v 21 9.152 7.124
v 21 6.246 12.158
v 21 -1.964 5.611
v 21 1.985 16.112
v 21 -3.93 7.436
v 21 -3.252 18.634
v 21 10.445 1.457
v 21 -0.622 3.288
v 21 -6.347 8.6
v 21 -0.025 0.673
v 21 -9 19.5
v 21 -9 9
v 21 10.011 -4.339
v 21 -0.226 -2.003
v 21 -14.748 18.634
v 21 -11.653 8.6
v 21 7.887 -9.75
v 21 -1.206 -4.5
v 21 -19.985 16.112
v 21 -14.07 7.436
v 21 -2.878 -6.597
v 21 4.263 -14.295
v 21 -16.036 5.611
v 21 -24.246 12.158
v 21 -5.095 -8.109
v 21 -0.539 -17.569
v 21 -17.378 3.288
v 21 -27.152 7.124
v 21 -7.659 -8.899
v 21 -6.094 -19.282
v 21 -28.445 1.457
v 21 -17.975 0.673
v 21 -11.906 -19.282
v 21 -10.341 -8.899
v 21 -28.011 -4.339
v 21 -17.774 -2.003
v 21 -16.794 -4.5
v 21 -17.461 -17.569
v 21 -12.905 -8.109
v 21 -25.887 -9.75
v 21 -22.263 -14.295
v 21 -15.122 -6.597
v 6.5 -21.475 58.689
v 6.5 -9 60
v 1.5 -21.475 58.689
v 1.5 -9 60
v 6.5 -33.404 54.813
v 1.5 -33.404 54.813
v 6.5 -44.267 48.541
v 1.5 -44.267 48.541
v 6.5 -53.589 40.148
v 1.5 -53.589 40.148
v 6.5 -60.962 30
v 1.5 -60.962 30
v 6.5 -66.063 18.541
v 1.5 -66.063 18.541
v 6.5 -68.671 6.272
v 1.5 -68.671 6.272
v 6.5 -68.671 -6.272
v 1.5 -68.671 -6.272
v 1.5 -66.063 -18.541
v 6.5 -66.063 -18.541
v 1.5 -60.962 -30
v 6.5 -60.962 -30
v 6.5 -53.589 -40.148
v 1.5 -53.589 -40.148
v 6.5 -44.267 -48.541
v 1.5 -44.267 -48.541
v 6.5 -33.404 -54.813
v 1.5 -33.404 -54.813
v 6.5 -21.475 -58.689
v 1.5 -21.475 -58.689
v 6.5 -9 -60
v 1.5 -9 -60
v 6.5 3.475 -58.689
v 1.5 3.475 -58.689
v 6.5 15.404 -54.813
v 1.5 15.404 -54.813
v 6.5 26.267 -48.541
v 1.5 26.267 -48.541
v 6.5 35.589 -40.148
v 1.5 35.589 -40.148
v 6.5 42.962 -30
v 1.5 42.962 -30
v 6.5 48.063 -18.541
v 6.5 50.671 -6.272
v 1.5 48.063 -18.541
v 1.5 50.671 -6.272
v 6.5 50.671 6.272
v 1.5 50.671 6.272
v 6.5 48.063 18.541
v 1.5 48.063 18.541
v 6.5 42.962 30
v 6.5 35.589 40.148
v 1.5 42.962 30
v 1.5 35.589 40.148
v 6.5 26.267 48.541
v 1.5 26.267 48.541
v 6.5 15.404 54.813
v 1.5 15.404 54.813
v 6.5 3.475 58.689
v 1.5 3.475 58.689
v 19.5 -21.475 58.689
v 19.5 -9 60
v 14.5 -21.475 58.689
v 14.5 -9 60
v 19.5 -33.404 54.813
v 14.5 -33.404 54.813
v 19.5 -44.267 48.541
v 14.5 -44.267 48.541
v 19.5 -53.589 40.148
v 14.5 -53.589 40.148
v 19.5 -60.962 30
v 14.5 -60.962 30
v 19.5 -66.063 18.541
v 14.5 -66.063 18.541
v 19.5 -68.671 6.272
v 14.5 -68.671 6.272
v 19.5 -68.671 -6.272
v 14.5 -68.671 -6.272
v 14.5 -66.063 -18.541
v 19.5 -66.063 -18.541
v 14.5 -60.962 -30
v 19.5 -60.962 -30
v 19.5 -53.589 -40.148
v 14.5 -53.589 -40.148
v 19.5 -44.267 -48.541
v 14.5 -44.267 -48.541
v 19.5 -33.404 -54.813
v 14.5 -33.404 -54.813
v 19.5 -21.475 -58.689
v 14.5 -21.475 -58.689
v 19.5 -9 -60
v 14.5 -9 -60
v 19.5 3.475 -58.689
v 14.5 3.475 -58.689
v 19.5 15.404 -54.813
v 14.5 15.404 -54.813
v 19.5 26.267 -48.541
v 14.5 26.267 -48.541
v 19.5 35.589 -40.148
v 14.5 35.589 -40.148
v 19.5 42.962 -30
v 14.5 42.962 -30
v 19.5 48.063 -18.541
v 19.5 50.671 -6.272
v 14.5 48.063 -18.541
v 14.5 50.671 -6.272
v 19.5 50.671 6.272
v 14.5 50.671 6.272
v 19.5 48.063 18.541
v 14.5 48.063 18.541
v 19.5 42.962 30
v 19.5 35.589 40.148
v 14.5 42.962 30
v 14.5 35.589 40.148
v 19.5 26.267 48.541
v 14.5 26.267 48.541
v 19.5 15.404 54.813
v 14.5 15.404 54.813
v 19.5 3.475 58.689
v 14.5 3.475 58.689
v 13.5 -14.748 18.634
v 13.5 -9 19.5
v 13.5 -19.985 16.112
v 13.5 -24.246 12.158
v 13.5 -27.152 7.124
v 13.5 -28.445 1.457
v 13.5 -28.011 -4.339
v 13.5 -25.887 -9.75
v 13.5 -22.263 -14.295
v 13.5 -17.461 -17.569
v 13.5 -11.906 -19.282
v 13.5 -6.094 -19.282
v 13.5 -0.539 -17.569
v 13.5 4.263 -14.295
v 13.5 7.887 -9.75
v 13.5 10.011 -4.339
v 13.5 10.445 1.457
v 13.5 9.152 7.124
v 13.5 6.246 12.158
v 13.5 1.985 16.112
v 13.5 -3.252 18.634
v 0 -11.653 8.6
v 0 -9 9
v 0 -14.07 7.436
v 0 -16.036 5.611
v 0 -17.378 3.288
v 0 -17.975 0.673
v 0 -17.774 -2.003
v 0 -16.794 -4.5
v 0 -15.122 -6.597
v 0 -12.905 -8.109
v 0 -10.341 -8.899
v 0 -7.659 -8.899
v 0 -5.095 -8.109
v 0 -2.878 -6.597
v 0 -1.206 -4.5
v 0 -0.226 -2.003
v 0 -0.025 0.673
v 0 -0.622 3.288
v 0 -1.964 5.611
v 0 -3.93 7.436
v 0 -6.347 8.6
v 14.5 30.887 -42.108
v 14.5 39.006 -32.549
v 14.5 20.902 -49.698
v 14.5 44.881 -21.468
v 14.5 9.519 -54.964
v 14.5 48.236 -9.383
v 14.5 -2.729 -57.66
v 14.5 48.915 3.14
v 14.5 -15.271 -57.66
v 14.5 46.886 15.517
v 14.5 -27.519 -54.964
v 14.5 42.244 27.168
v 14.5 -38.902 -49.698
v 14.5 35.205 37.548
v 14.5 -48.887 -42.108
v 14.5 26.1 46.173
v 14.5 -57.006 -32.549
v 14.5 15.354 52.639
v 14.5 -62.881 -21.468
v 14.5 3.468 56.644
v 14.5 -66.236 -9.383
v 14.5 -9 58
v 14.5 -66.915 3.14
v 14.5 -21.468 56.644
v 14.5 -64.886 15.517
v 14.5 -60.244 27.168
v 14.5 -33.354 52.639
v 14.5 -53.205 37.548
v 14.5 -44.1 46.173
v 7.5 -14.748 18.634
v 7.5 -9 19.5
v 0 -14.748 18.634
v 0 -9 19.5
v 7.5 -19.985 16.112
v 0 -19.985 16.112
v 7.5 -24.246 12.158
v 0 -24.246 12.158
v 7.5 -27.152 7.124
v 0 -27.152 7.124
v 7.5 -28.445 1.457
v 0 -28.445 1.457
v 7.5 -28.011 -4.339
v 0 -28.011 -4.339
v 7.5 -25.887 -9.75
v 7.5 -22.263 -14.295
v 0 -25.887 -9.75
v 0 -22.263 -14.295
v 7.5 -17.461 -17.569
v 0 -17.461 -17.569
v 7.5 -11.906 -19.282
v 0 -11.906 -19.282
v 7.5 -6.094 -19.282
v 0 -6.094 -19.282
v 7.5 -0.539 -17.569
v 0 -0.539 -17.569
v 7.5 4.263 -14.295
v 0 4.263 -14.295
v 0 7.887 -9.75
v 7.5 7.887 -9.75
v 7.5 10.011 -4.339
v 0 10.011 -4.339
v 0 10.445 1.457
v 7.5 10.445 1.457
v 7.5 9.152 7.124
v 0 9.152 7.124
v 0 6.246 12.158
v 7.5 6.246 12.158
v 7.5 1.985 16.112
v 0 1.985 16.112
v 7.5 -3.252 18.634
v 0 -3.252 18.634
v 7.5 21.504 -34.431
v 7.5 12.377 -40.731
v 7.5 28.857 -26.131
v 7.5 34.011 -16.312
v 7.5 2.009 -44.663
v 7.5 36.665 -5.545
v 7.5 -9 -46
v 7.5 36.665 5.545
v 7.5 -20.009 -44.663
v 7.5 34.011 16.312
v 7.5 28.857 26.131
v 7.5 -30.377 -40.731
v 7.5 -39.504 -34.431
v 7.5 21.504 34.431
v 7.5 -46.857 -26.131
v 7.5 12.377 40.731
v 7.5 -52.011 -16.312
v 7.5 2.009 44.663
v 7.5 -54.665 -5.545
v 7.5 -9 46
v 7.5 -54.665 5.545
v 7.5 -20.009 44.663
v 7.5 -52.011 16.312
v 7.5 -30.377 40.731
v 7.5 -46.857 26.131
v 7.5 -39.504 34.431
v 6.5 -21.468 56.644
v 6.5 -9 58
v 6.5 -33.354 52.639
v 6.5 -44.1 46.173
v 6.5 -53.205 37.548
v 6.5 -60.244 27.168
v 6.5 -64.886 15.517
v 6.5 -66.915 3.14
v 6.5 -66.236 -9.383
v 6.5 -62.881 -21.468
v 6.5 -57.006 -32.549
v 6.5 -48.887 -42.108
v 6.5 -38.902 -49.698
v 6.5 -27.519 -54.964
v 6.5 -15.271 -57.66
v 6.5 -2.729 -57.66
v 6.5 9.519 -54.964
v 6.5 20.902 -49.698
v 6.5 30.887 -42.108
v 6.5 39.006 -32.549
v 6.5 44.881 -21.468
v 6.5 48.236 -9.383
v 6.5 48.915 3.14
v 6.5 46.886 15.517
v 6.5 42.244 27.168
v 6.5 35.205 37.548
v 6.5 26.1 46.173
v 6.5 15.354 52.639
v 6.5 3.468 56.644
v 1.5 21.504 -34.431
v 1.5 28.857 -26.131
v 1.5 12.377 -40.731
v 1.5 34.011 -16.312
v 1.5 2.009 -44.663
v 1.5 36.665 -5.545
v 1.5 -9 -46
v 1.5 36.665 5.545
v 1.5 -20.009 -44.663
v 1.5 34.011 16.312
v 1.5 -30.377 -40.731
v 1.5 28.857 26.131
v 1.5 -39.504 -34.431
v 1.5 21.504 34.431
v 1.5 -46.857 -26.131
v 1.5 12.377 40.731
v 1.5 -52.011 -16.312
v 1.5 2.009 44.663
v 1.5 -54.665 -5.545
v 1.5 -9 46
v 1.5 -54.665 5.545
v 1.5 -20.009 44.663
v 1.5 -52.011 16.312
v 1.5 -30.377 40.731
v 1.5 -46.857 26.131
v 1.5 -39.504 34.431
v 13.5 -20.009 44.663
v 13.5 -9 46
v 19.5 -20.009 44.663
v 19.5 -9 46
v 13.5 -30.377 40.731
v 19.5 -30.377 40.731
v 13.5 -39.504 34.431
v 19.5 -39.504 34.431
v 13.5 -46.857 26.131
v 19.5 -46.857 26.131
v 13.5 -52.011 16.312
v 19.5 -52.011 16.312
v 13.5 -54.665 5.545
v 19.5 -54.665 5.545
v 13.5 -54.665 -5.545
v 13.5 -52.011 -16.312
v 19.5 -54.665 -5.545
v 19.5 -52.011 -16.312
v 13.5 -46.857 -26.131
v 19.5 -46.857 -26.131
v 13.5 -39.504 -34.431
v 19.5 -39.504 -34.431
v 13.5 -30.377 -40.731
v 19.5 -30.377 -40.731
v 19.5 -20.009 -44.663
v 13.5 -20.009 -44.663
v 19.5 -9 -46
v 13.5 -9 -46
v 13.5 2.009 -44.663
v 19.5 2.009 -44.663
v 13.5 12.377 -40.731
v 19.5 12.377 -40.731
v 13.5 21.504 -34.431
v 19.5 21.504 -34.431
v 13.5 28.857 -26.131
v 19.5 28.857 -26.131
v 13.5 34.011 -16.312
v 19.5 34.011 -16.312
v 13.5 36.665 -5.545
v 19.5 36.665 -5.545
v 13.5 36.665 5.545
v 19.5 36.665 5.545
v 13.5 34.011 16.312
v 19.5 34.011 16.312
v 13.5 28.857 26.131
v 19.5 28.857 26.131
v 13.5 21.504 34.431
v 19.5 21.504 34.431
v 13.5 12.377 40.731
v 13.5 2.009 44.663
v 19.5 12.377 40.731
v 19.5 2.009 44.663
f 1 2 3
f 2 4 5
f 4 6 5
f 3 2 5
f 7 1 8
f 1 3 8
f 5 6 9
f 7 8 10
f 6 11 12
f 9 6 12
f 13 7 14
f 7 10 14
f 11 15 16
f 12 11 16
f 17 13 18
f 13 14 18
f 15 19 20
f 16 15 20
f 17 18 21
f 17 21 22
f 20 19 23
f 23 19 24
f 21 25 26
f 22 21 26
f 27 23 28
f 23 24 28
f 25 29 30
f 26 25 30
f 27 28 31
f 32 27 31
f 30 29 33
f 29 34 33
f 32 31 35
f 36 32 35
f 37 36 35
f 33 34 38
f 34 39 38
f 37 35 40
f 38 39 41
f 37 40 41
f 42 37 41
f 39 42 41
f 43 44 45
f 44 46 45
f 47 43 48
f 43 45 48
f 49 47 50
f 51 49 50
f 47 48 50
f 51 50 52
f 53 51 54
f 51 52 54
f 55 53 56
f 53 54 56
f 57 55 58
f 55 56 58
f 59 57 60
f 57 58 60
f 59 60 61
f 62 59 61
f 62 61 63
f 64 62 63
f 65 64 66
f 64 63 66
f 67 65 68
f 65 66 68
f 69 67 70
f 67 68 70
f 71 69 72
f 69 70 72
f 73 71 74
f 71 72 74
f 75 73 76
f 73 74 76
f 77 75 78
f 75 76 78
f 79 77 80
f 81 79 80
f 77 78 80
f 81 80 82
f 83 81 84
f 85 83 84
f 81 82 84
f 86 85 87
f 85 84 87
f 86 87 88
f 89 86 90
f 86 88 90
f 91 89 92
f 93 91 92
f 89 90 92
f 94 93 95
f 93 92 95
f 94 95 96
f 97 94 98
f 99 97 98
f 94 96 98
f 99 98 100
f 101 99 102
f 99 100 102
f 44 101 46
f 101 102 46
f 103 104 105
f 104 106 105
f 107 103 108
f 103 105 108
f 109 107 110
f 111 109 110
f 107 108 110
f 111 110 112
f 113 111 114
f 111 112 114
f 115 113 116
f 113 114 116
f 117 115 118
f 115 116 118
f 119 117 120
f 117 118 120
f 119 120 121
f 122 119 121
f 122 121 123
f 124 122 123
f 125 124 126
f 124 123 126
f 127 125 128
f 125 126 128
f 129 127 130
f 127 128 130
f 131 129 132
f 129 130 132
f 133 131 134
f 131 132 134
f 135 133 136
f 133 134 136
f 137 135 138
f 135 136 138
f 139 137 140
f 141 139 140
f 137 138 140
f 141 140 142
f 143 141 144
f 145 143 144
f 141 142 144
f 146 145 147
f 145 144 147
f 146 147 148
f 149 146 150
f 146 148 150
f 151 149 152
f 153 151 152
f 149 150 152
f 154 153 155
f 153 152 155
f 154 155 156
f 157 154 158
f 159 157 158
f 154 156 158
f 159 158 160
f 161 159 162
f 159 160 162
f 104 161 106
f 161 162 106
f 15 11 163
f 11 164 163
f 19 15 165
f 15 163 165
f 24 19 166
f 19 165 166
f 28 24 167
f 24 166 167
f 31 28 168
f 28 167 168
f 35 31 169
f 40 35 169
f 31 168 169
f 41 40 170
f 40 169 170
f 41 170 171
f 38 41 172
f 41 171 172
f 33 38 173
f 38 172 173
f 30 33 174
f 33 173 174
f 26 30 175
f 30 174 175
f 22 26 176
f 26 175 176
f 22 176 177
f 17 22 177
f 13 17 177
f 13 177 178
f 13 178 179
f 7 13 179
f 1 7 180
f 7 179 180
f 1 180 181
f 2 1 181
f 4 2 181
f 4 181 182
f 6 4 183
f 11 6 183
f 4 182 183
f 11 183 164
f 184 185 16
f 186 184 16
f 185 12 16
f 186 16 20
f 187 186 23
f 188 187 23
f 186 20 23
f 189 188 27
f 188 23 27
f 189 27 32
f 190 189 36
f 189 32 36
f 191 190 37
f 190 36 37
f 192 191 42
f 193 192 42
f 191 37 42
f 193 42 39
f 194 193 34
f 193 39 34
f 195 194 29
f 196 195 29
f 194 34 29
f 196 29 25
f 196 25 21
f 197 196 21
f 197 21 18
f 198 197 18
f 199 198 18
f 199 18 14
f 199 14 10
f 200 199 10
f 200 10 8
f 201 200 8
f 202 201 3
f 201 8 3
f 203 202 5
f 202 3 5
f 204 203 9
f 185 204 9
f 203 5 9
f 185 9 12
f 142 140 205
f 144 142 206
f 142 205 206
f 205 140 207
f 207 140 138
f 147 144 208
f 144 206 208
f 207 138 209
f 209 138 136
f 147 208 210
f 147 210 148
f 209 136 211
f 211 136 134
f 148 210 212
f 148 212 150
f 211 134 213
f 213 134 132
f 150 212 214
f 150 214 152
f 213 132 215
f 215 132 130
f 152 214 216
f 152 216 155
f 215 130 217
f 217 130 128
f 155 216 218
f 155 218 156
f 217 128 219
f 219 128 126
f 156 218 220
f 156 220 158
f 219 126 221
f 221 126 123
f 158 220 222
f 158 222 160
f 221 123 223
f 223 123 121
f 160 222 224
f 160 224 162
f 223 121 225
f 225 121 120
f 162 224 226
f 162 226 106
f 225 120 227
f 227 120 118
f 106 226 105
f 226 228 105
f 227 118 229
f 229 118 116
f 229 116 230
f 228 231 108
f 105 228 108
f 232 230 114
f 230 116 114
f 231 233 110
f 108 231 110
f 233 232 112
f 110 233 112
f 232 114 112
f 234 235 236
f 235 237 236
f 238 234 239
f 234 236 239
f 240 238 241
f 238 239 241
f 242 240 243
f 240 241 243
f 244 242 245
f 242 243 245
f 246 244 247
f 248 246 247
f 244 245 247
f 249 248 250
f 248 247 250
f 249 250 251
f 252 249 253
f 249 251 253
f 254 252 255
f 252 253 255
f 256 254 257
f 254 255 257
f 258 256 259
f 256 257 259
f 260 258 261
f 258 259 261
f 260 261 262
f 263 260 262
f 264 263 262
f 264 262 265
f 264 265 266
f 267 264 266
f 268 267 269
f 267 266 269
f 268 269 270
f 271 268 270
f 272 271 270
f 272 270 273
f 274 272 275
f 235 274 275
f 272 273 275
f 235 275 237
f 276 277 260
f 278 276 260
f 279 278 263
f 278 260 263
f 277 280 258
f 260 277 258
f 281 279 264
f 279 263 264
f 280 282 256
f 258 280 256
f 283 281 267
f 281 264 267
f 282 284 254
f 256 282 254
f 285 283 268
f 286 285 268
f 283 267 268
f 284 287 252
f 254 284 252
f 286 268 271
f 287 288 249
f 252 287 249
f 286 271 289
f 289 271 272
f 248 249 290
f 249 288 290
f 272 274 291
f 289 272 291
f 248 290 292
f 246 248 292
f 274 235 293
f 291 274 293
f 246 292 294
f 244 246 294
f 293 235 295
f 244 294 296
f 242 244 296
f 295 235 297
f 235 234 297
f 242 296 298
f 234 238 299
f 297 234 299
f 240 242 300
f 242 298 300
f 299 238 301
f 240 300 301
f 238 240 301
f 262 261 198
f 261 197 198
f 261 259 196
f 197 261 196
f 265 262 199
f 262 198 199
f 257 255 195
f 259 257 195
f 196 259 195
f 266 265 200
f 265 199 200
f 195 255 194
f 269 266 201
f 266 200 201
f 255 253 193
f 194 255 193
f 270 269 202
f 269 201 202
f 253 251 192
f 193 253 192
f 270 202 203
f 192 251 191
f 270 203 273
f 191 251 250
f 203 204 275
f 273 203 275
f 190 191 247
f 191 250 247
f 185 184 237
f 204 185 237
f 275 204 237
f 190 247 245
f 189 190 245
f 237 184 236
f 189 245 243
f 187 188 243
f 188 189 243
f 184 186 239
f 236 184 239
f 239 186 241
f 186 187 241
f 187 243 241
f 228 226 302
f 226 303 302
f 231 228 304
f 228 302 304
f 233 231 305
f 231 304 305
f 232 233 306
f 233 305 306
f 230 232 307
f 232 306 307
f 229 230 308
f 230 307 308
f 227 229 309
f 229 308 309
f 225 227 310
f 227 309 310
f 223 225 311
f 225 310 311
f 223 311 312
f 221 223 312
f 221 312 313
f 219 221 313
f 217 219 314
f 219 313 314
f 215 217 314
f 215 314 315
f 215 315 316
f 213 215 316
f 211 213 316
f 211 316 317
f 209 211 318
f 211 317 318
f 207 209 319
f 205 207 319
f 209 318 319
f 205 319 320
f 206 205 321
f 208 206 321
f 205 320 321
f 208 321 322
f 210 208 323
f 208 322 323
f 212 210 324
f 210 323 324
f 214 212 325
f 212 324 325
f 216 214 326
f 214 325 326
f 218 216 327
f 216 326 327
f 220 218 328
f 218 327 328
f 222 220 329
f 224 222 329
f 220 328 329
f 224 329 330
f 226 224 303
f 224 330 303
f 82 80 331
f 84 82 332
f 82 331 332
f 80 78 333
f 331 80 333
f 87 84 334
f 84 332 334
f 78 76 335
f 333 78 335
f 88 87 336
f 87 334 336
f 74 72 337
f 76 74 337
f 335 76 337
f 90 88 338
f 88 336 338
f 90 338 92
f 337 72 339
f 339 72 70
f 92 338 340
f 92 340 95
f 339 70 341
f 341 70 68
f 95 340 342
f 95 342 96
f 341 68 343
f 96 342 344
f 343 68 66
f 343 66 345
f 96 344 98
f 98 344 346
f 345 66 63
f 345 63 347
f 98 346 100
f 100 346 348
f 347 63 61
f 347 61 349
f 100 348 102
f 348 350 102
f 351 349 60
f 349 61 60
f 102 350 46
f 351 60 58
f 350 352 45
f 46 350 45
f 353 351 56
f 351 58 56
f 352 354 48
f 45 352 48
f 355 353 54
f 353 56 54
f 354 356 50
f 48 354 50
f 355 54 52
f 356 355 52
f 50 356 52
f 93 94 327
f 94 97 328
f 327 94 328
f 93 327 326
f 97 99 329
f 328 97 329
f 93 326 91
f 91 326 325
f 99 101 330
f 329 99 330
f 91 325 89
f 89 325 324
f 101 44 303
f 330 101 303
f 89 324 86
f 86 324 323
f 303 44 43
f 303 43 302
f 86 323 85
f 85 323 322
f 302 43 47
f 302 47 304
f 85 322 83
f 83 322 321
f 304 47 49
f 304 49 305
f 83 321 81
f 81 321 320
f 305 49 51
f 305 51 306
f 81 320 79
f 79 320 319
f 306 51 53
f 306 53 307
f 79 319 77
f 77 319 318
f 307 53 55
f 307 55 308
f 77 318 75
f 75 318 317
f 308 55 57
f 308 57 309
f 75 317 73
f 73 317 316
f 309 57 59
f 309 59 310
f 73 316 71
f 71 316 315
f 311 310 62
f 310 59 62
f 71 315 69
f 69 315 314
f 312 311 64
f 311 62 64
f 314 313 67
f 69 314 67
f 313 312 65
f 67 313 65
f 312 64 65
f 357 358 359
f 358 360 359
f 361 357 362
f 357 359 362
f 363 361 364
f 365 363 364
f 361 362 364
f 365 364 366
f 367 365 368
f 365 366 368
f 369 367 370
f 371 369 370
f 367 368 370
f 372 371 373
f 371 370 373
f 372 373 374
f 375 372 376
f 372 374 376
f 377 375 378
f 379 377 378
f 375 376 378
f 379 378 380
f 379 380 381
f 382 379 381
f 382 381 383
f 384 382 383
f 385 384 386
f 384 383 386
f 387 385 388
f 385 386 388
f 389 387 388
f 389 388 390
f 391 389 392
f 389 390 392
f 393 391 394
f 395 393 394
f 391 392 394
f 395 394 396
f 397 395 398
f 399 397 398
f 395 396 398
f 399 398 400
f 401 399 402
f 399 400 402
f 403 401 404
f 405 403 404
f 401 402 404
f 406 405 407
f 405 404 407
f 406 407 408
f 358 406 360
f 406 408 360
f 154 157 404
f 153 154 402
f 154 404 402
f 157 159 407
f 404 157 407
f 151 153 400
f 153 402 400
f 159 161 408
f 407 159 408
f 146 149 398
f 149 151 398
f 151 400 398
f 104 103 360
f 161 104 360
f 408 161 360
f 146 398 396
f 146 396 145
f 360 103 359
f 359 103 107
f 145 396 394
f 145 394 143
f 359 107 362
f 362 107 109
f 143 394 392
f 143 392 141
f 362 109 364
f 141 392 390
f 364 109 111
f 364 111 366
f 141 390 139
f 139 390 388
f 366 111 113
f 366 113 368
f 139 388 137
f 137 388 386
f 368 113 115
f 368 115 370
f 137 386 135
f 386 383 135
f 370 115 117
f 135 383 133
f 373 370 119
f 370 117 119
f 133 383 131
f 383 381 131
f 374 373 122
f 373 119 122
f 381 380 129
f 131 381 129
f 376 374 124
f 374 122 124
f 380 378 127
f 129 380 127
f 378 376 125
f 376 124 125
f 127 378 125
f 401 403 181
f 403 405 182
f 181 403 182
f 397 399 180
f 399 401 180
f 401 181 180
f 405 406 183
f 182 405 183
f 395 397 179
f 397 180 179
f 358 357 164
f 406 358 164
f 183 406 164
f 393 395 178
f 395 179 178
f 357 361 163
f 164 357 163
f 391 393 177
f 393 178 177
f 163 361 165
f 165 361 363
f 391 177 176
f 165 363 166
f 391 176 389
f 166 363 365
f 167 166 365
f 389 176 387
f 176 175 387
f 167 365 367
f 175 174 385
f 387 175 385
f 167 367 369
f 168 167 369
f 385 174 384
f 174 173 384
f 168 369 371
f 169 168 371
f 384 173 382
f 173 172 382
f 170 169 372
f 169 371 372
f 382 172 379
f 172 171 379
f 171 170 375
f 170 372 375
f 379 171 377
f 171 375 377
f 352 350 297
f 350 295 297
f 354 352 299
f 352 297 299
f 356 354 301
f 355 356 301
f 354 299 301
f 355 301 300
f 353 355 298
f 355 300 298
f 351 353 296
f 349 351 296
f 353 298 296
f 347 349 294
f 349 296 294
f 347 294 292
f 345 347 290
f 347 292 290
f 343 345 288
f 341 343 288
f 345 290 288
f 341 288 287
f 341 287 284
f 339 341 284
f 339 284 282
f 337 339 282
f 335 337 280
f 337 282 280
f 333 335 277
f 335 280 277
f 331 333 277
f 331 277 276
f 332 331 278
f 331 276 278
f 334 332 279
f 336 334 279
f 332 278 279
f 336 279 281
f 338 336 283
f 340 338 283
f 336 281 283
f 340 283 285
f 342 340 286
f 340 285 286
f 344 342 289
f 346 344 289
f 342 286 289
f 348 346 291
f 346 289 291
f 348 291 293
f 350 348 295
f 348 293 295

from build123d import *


with BuildPart() as part:
    # Esquisse1 → Révolution1 (revolve)
    with BuildSketch(Plane.XY, mode=Mode.PRIVATE) as r_volution1_sk:
        Polygon((0, 0), (21, 0), (21, 10.5), (13.5, 10.5), (13.5, 37), (19.5, 37), (19.5, 51), (14.5, 51), (14.5, 49), (6.5, 49), (6.5, 51), (1.5, 51), (1.5, 37), (7.5, 37), (7.5, 10.5), (0, 10.5), align=None)
    revolve(r_volution1_sk.sketch.rotate(Axis((0, -9, 0), (1, 0, 0)), 90), axis=Axis((0, -9, 0), (1, 0, 0)))


solid = part.part
